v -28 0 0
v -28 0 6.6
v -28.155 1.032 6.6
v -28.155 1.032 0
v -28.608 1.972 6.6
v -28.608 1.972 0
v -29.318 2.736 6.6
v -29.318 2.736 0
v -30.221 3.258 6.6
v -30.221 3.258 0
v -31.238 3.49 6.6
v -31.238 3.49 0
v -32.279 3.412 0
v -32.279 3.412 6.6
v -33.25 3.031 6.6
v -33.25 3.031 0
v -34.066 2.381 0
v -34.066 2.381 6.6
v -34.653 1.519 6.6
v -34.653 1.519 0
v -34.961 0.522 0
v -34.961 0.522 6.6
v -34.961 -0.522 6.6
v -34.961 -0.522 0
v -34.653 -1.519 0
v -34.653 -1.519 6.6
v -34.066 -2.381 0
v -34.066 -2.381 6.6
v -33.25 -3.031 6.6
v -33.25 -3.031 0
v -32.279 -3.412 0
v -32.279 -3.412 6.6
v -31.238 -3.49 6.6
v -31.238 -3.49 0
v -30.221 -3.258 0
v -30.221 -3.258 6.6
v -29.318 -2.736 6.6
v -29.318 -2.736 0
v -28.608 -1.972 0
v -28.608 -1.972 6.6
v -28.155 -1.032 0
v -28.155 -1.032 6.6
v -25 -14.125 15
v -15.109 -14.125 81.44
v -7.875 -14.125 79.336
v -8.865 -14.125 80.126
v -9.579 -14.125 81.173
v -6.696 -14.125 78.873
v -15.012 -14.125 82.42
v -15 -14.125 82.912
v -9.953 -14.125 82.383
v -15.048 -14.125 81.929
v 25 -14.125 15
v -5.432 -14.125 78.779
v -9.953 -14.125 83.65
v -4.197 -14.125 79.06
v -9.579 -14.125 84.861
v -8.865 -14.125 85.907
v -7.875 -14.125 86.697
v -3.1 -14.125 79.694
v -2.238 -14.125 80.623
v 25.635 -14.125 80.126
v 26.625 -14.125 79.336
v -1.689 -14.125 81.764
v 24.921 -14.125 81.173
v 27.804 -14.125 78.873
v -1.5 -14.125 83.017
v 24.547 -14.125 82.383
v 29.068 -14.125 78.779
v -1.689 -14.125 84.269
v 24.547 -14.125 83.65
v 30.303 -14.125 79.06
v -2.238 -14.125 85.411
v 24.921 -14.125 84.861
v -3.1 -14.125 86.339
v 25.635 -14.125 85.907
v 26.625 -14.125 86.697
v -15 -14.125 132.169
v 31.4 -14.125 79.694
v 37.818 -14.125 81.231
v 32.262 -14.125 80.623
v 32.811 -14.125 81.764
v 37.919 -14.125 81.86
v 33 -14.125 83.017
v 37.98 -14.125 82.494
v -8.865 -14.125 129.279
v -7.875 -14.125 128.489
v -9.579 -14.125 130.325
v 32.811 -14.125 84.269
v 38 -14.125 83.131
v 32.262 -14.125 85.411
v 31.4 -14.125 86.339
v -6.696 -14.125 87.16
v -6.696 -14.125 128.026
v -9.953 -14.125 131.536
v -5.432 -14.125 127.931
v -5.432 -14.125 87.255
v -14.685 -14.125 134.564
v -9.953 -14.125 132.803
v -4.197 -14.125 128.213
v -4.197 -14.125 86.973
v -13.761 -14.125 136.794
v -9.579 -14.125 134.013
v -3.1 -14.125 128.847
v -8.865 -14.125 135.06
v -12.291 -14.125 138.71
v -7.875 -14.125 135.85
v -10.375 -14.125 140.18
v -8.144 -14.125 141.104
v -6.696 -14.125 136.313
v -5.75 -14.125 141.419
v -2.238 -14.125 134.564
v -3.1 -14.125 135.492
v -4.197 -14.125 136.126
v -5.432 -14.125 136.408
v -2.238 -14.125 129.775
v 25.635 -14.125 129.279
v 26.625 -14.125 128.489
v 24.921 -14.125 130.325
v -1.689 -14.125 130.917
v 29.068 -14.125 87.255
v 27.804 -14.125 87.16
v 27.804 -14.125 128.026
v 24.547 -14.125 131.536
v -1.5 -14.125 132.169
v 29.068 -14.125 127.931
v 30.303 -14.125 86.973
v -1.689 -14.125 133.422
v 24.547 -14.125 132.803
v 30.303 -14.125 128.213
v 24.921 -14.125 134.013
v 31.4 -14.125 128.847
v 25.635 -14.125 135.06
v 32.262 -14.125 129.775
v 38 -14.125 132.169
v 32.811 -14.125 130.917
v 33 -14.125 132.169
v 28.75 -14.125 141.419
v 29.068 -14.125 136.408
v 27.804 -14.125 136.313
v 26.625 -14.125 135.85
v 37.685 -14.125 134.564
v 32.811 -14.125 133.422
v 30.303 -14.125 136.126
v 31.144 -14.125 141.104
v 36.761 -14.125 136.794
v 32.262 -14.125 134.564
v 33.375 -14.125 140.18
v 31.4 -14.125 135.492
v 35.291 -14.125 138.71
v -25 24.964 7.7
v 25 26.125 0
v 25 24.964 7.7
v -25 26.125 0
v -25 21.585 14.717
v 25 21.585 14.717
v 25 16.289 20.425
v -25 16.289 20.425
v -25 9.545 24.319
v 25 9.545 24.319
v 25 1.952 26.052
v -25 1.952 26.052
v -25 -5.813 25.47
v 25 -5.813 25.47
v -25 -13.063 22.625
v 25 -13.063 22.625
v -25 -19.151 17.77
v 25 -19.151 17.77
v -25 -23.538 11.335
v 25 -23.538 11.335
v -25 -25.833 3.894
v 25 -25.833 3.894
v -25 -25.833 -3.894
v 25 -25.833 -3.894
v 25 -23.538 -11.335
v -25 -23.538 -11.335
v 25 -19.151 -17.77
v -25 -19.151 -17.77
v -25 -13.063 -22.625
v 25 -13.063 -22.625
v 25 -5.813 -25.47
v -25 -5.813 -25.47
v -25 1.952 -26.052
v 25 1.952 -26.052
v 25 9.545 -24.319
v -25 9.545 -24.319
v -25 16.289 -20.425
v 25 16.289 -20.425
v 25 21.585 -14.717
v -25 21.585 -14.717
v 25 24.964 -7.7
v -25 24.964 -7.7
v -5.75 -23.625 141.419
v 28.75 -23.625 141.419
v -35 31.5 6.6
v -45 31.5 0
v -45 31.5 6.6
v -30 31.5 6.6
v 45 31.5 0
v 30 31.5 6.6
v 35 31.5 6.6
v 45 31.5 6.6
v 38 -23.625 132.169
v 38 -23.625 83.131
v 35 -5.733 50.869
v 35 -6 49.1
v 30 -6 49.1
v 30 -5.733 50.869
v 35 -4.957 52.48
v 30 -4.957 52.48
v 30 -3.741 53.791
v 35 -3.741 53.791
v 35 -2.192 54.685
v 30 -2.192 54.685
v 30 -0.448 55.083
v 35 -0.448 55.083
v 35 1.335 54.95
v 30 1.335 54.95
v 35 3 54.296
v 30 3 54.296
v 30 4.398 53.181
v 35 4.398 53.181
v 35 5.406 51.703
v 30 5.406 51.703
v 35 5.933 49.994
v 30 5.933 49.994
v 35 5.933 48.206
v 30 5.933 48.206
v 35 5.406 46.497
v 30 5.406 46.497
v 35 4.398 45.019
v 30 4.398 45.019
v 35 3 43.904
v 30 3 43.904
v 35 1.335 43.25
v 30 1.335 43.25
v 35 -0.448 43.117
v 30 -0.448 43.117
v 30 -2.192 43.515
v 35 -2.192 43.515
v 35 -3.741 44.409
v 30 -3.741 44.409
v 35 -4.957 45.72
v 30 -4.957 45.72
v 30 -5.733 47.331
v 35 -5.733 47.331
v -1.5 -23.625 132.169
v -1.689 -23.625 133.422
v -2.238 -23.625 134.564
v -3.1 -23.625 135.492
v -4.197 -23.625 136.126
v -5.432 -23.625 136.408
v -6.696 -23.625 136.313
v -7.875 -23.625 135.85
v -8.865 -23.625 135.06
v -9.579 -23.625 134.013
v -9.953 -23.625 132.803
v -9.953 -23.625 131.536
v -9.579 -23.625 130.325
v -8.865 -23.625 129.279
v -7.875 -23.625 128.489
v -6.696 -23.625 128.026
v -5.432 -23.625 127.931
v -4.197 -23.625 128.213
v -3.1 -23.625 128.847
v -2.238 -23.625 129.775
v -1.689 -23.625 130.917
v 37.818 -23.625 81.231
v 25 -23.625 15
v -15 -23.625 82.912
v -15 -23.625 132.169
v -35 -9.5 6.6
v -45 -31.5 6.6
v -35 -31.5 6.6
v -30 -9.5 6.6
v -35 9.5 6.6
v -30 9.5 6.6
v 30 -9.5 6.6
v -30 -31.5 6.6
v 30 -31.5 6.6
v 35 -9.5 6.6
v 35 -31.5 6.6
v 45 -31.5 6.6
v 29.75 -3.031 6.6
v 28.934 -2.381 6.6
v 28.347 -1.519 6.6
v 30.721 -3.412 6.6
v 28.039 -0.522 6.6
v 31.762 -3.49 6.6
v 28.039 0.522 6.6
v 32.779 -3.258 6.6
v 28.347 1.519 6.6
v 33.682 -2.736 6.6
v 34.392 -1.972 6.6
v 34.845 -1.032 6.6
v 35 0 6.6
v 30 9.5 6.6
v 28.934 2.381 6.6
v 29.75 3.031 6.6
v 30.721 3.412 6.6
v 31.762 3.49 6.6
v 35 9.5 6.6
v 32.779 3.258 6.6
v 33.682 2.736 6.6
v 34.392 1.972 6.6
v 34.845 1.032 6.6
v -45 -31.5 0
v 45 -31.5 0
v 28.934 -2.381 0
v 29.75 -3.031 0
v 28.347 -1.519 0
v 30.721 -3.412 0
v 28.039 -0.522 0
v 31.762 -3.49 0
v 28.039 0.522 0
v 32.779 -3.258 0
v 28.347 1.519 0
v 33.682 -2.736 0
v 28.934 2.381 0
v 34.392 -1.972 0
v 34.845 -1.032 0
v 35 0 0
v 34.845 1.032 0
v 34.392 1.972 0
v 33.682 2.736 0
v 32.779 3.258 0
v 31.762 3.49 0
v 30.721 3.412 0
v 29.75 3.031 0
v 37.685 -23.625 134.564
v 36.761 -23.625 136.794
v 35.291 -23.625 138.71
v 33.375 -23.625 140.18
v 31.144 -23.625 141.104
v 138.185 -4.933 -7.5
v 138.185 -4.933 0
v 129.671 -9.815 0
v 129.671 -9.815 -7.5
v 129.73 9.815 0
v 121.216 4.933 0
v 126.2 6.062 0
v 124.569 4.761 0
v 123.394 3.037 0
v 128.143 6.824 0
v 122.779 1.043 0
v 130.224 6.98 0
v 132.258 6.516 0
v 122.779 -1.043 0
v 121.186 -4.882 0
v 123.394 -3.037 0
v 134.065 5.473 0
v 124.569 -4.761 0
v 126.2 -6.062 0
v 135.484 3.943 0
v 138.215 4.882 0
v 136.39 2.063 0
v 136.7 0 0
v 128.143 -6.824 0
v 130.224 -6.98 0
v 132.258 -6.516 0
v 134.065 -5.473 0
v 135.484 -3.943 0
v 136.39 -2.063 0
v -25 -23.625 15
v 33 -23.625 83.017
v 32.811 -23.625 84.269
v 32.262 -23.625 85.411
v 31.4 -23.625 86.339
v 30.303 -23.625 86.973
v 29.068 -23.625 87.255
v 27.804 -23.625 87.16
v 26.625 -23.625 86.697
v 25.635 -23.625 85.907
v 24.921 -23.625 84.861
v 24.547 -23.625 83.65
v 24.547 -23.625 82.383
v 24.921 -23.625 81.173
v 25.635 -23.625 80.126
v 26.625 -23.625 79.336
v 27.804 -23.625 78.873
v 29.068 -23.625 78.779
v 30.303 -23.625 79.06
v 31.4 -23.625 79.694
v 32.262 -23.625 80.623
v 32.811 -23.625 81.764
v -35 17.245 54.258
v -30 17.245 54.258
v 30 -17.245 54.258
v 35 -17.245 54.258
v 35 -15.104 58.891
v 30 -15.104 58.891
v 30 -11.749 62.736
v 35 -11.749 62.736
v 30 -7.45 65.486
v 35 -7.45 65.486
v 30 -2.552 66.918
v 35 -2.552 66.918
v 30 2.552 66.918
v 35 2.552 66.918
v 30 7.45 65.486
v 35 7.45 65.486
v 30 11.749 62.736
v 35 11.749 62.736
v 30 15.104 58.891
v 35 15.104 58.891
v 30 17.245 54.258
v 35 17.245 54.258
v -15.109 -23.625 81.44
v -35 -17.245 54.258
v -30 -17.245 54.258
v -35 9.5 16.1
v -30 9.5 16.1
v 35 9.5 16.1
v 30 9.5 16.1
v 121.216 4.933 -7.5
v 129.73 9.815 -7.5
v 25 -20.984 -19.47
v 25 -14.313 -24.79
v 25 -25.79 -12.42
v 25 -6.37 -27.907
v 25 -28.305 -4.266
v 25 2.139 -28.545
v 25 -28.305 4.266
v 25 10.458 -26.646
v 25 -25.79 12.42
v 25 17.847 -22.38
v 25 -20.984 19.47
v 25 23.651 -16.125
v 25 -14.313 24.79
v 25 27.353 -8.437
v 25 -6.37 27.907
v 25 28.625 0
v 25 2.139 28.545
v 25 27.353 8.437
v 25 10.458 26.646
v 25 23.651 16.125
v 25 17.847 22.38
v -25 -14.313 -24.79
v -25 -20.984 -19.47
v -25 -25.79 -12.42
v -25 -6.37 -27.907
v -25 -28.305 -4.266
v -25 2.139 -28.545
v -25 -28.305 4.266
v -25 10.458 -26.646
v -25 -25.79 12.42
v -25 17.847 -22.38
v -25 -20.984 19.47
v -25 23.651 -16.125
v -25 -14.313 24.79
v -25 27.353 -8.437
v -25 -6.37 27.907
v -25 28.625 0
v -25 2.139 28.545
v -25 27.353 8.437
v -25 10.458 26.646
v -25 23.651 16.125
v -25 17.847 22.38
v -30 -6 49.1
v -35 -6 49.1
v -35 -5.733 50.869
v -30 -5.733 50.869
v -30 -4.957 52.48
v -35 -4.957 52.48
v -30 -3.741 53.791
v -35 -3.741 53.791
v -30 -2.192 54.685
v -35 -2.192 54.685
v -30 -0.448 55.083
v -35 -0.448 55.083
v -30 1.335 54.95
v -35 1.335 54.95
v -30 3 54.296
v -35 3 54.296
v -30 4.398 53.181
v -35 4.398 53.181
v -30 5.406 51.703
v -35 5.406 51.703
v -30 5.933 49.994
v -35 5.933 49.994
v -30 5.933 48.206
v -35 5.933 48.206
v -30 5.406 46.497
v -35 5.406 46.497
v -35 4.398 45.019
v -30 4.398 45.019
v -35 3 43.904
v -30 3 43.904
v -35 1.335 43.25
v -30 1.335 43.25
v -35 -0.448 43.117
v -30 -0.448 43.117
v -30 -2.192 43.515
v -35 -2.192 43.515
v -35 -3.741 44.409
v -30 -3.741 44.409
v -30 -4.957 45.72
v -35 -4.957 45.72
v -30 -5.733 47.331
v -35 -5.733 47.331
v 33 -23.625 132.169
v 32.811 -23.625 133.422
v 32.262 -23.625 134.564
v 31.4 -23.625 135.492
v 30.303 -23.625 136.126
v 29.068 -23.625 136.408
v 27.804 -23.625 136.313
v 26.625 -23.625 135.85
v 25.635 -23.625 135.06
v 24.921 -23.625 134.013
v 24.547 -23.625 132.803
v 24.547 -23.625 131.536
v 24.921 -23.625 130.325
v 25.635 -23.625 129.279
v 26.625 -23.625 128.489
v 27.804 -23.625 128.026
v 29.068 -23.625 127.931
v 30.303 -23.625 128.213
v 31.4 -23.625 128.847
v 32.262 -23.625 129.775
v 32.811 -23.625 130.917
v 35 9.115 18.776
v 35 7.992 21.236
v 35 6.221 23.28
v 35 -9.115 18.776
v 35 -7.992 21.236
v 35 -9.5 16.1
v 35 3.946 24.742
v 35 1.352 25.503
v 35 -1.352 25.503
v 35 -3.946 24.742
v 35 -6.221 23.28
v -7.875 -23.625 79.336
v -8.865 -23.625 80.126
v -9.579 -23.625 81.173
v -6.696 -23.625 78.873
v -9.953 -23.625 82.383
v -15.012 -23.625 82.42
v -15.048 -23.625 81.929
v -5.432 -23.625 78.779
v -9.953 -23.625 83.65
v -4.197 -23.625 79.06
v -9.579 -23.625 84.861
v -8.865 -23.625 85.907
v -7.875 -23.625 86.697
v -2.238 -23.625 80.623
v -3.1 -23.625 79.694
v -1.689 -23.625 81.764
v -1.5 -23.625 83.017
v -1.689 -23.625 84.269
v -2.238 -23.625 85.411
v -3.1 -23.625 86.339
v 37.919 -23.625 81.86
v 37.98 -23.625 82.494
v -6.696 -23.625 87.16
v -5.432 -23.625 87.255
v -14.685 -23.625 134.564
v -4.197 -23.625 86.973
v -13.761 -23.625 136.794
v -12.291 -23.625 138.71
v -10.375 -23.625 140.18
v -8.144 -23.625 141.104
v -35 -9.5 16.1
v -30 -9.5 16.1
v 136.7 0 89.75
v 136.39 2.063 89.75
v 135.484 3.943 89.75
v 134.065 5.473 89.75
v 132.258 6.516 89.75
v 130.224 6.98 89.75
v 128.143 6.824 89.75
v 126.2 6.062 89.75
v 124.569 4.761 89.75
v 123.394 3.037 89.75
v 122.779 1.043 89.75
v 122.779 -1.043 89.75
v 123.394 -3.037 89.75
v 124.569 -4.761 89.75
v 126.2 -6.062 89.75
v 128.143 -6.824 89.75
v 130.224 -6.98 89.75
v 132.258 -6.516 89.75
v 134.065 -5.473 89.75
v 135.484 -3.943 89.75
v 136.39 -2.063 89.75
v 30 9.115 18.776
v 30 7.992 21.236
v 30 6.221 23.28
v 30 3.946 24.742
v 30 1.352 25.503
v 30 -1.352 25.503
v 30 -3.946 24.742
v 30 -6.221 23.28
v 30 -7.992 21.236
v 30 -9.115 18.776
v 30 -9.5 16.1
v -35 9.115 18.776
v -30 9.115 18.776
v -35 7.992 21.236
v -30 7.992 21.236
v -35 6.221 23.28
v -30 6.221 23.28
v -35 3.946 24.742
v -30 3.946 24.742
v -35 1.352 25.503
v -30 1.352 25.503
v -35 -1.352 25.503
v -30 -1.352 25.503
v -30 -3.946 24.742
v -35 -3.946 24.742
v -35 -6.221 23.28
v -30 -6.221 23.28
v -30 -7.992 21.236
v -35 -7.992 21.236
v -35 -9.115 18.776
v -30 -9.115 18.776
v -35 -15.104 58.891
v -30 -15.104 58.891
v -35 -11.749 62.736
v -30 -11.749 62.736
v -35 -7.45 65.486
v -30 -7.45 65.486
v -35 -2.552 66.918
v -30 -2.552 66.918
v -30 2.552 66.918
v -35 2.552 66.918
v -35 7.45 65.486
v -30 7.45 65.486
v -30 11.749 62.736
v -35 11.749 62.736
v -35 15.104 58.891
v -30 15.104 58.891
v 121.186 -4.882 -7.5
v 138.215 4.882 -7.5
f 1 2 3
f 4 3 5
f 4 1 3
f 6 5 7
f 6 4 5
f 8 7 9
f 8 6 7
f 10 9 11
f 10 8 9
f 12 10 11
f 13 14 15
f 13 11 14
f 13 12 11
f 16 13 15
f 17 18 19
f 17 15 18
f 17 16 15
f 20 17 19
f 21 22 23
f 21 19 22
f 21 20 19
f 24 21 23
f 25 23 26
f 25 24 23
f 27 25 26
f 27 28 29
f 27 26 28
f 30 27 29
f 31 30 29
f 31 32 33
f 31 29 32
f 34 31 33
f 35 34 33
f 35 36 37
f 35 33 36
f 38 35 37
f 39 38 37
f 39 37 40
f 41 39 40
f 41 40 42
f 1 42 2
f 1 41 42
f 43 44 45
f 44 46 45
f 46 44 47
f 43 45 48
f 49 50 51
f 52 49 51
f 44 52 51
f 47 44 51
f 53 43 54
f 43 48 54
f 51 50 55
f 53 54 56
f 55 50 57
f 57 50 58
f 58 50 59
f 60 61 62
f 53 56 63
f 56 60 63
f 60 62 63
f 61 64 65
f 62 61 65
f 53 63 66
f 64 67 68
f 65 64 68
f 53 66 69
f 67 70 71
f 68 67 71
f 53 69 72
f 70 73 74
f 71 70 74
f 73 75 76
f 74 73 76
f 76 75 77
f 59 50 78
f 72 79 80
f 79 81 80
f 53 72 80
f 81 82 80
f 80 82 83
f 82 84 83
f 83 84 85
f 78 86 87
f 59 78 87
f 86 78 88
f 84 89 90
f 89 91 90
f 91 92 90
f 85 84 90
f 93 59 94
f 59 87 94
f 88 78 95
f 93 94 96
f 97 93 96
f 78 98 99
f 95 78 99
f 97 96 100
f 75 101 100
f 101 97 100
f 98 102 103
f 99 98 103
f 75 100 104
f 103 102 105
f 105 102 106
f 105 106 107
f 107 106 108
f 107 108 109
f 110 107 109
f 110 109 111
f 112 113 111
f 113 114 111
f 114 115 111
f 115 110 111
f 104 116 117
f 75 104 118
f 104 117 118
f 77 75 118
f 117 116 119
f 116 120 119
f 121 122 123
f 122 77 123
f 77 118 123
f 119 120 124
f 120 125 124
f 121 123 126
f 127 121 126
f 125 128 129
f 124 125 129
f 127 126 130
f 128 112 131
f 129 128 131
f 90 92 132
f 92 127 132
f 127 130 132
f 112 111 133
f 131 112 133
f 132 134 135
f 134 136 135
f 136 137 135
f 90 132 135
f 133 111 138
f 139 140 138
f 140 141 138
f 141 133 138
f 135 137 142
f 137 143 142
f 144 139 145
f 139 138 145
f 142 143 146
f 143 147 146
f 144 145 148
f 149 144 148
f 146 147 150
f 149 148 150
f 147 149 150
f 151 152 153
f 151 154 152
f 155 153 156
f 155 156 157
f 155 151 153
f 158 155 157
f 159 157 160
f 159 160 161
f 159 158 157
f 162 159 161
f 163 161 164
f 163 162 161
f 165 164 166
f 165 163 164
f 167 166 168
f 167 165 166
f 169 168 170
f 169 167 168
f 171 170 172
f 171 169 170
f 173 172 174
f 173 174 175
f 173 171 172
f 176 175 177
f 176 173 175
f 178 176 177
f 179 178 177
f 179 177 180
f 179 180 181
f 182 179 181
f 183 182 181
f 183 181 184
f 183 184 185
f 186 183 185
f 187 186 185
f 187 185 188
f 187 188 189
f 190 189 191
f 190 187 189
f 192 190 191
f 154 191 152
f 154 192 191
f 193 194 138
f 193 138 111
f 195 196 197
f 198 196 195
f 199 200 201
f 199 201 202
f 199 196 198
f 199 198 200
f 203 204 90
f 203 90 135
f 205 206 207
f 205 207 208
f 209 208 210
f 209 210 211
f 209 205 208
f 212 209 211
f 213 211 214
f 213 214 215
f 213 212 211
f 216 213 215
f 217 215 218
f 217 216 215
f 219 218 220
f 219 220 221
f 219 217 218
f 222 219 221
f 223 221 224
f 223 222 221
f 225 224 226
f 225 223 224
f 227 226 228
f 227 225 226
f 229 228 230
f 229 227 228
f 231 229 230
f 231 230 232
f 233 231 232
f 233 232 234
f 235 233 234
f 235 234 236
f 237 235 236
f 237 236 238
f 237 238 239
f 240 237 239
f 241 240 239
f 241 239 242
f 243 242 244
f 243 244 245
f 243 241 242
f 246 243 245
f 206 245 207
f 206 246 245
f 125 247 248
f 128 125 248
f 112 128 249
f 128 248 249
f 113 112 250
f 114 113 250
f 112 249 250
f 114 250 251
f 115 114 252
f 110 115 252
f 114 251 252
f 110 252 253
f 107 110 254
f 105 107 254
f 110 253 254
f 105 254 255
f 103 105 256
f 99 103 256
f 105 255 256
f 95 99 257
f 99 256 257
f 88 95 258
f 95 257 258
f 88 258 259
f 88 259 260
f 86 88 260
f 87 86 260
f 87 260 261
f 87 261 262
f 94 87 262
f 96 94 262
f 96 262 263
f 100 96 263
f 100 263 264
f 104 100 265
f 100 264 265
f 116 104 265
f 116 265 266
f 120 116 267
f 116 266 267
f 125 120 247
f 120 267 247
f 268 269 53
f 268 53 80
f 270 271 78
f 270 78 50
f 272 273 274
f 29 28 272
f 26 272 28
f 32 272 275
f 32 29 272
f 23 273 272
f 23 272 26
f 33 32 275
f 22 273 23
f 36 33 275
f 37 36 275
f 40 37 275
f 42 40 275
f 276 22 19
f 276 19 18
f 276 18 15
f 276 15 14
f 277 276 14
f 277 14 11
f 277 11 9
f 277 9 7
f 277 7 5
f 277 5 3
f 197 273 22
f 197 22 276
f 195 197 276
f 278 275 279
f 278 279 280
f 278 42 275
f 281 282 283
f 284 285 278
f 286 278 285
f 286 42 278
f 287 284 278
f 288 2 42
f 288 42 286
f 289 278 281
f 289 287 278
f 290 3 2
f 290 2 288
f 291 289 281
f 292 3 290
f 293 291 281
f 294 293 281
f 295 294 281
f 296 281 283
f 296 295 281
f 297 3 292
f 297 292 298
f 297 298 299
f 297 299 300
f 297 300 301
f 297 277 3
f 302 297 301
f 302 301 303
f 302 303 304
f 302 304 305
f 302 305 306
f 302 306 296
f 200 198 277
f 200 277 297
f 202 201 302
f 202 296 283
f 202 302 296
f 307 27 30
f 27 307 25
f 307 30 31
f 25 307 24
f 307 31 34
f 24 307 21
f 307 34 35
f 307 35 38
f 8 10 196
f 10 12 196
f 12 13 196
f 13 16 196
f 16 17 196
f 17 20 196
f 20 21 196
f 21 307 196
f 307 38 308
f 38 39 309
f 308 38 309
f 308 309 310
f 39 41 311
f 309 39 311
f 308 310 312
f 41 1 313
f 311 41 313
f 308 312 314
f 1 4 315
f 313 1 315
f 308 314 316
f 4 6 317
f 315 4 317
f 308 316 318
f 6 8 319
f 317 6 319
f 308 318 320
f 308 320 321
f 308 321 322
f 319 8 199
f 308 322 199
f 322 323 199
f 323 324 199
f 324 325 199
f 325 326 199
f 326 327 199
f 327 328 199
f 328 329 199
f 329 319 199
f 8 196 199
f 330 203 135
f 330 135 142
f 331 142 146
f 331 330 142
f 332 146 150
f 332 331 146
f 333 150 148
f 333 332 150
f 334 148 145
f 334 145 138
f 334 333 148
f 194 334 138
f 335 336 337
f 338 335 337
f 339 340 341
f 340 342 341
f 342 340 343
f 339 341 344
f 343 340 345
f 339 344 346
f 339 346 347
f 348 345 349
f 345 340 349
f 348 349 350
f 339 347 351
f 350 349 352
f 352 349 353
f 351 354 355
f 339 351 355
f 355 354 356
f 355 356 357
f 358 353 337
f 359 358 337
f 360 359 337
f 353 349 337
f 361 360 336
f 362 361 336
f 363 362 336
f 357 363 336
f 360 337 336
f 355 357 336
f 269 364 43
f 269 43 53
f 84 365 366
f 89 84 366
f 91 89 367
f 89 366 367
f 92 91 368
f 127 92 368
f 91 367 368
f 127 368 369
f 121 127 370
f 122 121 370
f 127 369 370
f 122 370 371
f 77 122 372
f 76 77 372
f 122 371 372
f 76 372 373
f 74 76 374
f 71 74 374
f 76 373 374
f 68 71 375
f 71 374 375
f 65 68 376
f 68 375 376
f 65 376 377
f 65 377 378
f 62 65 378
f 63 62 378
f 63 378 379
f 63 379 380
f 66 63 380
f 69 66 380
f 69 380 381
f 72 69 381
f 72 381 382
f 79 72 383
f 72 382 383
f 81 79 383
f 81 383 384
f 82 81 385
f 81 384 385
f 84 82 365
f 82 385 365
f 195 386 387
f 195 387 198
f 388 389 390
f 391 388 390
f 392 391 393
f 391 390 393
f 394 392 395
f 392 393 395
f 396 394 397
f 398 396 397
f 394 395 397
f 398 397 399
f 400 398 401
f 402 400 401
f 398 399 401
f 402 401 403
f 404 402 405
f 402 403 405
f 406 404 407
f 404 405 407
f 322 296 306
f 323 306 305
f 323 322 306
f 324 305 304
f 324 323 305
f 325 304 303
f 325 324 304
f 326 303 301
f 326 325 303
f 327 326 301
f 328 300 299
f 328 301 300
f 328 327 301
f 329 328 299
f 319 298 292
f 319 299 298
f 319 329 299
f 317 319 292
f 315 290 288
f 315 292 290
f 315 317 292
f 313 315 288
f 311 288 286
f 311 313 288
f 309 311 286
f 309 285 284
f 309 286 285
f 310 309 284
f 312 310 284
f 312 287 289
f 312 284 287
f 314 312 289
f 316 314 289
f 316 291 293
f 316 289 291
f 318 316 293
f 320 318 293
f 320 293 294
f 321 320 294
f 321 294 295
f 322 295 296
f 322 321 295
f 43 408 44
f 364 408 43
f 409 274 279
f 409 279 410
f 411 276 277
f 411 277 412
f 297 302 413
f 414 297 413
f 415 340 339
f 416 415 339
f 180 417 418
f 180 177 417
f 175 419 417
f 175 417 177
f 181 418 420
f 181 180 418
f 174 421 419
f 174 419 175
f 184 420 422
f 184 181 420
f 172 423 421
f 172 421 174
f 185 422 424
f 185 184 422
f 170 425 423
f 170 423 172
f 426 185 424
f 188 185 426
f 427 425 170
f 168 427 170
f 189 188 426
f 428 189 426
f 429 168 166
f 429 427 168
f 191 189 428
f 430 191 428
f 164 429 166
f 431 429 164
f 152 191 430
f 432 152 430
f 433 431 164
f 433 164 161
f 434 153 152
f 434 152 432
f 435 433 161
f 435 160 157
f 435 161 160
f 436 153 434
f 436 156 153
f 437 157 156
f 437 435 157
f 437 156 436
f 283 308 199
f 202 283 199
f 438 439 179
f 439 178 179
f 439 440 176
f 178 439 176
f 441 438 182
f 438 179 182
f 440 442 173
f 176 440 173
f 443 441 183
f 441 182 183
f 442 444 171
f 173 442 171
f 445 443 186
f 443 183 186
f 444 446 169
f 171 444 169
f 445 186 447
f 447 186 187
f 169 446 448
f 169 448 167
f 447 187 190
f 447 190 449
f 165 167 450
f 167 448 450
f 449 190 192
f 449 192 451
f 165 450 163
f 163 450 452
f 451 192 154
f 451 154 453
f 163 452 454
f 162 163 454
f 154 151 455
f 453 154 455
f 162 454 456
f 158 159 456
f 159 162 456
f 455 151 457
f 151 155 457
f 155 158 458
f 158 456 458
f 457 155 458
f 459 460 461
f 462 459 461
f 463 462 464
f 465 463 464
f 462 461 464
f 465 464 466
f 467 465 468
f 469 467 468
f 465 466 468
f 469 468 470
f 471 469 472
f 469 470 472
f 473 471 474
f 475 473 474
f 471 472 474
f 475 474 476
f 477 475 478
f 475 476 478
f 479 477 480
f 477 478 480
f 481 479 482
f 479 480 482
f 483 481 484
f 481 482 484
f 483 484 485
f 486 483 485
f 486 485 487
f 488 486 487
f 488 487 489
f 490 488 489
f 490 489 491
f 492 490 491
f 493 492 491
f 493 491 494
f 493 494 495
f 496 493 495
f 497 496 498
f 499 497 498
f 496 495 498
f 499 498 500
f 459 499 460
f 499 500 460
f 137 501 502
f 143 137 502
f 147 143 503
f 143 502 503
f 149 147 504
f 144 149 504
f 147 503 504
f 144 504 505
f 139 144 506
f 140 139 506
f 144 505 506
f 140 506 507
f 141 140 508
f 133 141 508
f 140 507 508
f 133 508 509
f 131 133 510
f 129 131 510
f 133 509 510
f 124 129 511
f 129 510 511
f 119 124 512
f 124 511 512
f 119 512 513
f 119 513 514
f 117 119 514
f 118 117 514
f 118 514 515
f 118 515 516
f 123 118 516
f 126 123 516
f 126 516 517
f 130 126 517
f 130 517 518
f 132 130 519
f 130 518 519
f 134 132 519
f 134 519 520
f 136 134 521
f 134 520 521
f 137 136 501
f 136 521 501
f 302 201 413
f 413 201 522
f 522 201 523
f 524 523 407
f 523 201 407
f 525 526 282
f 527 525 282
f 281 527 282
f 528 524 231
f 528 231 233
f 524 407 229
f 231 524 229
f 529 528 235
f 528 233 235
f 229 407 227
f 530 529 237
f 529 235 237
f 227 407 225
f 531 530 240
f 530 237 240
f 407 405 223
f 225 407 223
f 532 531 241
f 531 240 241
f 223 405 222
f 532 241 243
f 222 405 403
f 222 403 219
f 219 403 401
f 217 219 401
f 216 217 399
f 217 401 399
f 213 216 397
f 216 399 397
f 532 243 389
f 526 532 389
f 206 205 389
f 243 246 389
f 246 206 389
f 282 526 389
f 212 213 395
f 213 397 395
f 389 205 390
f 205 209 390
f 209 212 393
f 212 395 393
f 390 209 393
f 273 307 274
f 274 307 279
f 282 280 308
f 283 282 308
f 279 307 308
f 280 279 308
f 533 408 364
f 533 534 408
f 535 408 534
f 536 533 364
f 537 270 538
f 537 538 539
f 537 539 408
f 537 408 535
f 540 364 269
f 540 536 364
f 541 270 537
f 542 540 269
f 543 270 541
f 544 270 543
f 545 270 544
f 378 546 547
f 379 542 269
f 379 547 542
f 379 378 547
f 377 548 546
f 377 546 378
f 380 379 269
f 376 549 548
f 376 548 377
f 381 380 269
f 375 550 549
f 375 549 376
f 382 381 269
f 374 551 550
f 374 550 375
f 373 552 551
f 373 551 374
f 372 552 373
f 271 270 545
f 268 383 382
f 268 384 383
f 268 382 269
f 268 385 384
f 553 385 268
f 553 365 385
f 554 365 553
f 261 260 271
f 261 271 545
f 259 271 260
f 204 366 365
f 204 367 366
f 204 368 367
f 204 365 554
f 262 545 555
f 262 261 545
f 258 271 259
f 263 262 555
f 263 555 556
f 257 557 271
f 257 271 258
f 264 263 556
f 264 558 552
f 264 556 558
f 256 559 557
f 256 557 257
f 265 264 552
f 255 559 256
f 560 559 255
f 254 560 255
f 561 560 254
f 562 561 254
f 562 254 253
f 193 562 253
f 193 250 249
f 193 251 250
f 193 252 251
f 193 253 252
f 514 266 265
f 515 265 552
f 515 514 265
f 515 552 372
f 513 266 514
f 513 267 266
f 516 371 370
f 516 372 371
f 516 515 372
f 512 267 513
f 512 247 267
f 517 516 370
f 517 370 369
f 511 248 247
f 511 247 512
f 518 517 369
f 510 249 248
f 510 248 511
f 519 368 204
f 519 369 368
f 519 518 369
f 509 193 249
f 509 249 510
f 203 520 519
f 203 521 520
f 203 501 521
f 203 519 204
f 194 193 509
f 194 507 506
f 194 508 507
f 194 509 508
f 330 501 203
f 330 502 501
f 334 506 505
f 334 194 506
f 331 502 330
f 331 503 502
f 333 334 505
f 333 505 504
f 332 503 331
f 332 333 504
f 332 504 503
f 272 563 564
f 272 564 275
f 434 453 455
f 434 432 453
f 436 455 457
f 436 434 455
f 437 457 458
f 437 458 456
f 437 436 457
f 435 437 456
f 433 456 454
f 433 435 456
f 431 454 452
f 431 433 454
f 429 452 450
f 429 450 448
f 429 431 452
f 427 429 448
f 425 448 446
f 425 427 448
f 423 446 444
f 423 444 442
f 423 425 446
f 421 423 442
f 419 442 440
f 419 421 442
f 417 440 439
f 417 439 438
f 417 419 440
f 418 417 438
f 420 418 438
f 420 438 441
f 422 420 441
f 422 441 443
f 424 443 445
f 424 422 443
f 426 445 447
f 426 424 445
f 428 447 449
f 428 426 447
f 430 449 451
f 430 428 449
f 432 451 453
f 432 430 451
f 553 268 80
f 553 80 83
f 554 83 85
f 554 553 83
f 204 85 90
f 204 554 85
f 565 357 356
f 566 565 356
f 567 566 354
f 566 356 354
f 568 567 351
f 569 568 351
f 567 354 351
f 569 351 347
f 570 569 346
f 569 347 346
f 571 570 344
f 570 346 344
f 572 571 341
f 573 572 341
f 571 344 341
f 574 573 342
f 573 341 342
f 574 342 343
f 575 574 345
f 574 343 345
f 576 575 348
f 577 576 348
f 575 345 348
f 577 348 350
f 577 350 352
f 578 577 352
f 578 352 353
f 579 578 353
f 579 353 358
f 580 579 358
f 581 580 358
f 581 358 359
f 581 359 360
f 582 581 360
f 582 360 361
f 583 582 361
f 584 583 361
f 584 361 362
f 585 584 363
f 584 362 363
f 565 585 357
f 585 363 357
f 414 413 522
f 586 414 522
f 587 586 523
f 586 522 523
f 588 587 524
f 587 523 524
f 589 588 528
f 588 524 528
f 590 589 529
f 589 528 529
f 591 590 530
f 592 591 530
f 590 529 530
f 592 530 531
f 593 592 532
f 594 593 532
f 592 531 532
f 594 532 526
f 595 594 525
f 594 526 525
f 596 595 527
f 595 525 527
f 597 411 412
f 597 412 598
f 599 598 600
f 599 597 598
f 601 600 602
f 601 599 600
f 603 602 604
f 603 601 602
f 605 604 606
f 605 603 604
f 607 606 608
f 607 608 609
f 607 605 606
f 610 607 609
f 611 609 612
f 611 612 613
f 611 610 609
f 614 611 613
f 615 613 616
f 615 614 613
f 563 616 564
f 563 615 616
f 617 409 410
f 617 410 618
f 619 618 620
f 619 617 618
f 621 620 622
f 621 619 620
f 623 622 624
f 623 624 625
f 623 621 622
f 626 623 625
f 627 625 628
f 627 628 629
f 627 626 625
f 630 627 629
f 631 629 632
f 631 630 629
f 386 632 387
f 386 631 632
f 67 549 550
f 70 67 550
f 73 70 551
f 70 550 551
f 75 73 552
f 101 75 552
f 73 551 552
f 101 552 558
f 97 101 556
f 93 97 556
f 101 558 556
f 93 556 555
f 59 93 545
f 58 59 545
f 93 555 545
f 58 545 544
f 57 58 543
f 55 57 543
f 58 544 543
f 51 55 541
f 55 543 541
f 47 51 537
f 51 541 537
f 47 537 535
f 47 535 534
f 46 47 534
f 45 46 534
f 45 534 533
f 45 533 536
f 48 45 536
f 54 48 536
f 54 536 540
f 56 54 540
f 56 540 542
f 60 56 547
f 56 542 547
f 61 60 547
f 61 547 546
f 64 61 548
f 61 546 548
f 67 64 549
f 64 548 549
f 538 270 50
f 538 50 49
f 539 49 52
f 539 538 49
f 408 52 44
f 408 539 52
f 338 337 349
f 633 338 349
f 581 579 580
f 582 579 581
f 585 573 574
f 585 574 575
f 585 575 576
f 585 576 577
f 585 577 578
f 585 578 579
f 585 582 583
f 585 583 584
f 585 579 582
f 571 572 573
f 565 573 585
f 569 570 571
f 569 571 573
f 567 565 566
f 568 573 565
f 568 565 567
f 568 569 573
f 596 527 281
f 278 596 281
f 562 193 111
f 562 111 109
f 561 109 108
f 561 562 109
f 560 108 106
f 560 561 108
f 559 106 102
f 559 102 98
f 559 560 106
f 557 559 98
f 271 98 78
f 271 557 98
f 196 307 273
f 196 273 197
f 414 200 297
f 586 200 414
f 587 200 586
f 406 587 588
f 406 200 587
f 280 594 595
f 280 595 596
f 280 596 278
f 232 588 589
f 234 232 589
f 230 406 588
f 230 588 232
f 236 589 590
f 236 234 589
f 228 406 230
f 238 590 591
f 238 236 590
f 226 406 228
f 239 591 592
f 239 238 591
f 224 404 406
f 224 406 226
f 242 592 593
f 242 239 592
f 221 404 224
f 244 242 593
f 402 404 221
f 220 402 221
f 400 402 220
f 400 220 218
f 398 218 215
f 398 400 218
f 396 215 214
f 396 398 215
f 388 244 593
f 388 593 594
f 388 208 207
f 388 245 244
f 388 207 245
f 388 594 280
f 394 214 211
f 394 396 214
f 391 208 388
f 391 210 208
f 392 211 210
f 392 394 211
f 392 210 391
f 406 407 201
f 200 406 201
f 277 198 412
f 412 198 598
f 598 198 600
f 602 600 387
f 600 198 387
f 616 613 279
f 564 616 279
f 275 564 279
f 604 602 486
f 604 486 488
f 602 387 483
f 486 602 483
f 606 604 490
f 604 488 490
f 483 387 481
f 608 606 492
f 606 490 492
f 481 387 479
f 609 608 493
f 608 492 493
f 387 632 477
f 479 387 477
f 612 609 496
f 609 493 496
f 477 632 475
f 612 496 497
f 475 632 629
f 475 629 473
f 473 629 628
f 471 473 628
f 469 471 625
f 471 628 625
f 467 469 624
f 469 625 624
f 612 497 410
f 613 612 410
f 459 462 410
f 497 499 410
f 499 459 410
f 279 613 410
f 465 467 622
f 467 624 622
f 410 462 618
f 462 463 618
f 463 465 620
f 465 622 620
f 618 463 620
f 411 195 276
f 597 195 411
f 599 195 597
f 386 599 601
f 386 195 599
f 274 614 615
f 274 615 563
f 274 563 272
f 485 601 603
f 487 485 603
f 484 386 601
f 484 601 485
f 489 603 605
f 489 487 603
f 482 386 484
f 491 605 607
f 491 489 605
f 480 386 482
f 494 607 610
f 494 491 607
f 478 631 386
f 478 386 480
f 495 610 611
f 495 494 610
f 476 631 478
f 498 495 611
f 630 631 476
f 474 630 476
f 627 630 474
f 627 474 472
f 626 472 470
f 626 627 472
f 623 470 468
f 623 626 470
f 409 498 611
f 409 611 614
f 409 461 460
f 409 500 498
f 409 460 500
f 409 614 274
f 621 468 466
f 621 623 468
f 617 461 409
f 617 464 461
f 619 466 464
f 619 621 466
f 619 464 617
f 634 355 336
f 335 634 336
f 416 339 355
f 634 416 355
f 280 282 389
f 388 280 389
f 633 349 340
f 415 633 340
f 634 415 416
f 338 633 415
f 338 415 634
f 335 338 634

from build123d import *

# Parameters (mm, degrees)
F0_W      = 90
F0_H      = 63
F0_R      = 3.5
F1_DEPTH  = 6.6
F3_R      = 6
F4_DEPTH  = 5
F6_R      = 28.625
F6_R_2    = 26.125
F7_DEPTH  = 25
F9_R      = 4.25
F10_DEPTH = 9.5
F11_R     = 7
F12_DEPTH = 89.75
F13_R     = 7
F14_DEPTH = 7.5


with BuildPart() as f1:
    # F0 (on Top) → F1 (new body)
    with BuildSketch(Plane.XY):
        Rectangle(F0_W, F0_H)
        with Locations((-31.5, 0)):
            Circle(F0_R, mode=Mode.SUBTRACT)
        with Locations((31.5, 0)):
            Circle(F0_R, mode=Mode.SUBTRACT)
    extrude(amount=F1_DEPTH)

    # F3 (on offset) → F4 (join)
    with BuildSketch(Plane(origin=(-35, 0, 0), x_dir=(0, -1, 0), z_dir=(-1, 0, 0))):
        with BuildLine():
            Line((-17.2451045222, 54.258136293), (-31.5, 6.6))
            Line((-31.5, 6.6), (-9.5, 6.6))
            Line((-9.5, 6.6), (-9.5, 16.1))
            ThreePointArc((-9.5, 16.1), (0, 25.6), (9.5, 16.1))
            Line((9.5, 16.1), (9.5, 6.6))
            Line((9.5, 6.6), (31.5, 6.6))
            Line((31.5, 6.6), (17.2451045222, 54.258136293))
            ThreePointArc((17.2451045222, 54.258136293), (0, 67.1), (-17.2451045222, 54.258136293))
        make_face()
        with Locations((0, 49.1)):
            Circle(F3_R, mode=Mode.SUBTRACT)
    extrude(amount=-F4_DEPTH)

    # F5: F1 across plane


with BuildPart() as f1_1:
    add(f1.part)
    add(f1.part.mirror(Plane.YZ))


with BuildPart() as f7:
    # F6 (on Right) → F7 (new body, symmetric)
    with BuildSketch(Plane.YZ):
        Circle(F6_R)
        Circle(F6_R_2, mode=Mode.SUBTRACT)
    extrude(amount=F7_DEPTH, both=True)


with BuildPart() as f10:
    # F9 (on offset) → F10 (new body)
    with BuildSketch(Plane.XZ.offset(23.625)):
        with BuildLine():
            Line((28.75, 141.4194731562), (-5.75, 141.4194731562))
            ThreePointArc((-5.75, 141.4194731562), (-12.290737726, 138.7102108822), (-15, 132.1694731562))
            Line((-15, 132.1694731562), (-15, 82.9123682714))
            ThreePointArc((-15, 82.9123682714), (-15.0272884401, 82.1741107665), (-15.1090048287, 81.4398824408))
            Line((-15.1090048287, 81.4398824408), (-25, 15))
            Line((-25, 15), (25, 15))
            Line((25, 15), (37.8178271303, 81.2307881629))
            ThreePointArc((37.8178271303, 81.2307881629), (37.9543525983, 82.1764671942), (38, 83.1308593298))
            Line((38, 83.1308593298), (38, 132.1694731562))
            ThreePointArc((38, 132.1694731562), (35.290737726, 138.7102108822), (28.75, 141.4194731562))
        make_face()
        with Locations((-5.75, 83.0166818202)):
            Circle(F9_R, mode=Mode.SUBTRACT)
        with Locations((-5.75, 132.1694731562)):
            Circle(F9_R, mode=Mode.SUBTRACT)
        with Locations((28.75, 83.0166818202)):
            Circle(F9_R, mode=Mode.SUBTRACT)
        with Locations((28.75, 132.1694731562)):
            Circle(F9_R, mode=Mode.SUBTRACT)
    extrude(amount=-F10_DEPTH)


with BuildPart() as f12:
    # F11 (on Top) → F12 (new body)
    with BuildSketch(Plane.XY):
        with Locations((129.7004967928, 0)):
            Circle(F11_R)
    extrude(amount=F12_DEPTH)

    # F13 (on face) → F14 (join)
    with BuildSketch(Plane(origin=(0, 0, 0), x_dir=(1, 0, 0), z_dir=(0, 0, -1))):
        Polygon((138.1854801239, 4.9333955046), (129.6705426244, 9.8149088677), (121.1855592933, 4.8815133631), (121.2155134617, -4.9333955046), (129.7304509612, -9.8149088677), (138.2154342922, -4.8815133631), align=None)
        with Locations((129.7004967928, 0)):
            Circle(F13_R, mode=Mode.SUBTRACT)
        with Locations((129.7004967928, 0)):
            Circle(F13_R)
    extrude(amount=F14_DEPTH)


solid = Compound([f1_1.part, f7.part, f10.part, f12.part])
